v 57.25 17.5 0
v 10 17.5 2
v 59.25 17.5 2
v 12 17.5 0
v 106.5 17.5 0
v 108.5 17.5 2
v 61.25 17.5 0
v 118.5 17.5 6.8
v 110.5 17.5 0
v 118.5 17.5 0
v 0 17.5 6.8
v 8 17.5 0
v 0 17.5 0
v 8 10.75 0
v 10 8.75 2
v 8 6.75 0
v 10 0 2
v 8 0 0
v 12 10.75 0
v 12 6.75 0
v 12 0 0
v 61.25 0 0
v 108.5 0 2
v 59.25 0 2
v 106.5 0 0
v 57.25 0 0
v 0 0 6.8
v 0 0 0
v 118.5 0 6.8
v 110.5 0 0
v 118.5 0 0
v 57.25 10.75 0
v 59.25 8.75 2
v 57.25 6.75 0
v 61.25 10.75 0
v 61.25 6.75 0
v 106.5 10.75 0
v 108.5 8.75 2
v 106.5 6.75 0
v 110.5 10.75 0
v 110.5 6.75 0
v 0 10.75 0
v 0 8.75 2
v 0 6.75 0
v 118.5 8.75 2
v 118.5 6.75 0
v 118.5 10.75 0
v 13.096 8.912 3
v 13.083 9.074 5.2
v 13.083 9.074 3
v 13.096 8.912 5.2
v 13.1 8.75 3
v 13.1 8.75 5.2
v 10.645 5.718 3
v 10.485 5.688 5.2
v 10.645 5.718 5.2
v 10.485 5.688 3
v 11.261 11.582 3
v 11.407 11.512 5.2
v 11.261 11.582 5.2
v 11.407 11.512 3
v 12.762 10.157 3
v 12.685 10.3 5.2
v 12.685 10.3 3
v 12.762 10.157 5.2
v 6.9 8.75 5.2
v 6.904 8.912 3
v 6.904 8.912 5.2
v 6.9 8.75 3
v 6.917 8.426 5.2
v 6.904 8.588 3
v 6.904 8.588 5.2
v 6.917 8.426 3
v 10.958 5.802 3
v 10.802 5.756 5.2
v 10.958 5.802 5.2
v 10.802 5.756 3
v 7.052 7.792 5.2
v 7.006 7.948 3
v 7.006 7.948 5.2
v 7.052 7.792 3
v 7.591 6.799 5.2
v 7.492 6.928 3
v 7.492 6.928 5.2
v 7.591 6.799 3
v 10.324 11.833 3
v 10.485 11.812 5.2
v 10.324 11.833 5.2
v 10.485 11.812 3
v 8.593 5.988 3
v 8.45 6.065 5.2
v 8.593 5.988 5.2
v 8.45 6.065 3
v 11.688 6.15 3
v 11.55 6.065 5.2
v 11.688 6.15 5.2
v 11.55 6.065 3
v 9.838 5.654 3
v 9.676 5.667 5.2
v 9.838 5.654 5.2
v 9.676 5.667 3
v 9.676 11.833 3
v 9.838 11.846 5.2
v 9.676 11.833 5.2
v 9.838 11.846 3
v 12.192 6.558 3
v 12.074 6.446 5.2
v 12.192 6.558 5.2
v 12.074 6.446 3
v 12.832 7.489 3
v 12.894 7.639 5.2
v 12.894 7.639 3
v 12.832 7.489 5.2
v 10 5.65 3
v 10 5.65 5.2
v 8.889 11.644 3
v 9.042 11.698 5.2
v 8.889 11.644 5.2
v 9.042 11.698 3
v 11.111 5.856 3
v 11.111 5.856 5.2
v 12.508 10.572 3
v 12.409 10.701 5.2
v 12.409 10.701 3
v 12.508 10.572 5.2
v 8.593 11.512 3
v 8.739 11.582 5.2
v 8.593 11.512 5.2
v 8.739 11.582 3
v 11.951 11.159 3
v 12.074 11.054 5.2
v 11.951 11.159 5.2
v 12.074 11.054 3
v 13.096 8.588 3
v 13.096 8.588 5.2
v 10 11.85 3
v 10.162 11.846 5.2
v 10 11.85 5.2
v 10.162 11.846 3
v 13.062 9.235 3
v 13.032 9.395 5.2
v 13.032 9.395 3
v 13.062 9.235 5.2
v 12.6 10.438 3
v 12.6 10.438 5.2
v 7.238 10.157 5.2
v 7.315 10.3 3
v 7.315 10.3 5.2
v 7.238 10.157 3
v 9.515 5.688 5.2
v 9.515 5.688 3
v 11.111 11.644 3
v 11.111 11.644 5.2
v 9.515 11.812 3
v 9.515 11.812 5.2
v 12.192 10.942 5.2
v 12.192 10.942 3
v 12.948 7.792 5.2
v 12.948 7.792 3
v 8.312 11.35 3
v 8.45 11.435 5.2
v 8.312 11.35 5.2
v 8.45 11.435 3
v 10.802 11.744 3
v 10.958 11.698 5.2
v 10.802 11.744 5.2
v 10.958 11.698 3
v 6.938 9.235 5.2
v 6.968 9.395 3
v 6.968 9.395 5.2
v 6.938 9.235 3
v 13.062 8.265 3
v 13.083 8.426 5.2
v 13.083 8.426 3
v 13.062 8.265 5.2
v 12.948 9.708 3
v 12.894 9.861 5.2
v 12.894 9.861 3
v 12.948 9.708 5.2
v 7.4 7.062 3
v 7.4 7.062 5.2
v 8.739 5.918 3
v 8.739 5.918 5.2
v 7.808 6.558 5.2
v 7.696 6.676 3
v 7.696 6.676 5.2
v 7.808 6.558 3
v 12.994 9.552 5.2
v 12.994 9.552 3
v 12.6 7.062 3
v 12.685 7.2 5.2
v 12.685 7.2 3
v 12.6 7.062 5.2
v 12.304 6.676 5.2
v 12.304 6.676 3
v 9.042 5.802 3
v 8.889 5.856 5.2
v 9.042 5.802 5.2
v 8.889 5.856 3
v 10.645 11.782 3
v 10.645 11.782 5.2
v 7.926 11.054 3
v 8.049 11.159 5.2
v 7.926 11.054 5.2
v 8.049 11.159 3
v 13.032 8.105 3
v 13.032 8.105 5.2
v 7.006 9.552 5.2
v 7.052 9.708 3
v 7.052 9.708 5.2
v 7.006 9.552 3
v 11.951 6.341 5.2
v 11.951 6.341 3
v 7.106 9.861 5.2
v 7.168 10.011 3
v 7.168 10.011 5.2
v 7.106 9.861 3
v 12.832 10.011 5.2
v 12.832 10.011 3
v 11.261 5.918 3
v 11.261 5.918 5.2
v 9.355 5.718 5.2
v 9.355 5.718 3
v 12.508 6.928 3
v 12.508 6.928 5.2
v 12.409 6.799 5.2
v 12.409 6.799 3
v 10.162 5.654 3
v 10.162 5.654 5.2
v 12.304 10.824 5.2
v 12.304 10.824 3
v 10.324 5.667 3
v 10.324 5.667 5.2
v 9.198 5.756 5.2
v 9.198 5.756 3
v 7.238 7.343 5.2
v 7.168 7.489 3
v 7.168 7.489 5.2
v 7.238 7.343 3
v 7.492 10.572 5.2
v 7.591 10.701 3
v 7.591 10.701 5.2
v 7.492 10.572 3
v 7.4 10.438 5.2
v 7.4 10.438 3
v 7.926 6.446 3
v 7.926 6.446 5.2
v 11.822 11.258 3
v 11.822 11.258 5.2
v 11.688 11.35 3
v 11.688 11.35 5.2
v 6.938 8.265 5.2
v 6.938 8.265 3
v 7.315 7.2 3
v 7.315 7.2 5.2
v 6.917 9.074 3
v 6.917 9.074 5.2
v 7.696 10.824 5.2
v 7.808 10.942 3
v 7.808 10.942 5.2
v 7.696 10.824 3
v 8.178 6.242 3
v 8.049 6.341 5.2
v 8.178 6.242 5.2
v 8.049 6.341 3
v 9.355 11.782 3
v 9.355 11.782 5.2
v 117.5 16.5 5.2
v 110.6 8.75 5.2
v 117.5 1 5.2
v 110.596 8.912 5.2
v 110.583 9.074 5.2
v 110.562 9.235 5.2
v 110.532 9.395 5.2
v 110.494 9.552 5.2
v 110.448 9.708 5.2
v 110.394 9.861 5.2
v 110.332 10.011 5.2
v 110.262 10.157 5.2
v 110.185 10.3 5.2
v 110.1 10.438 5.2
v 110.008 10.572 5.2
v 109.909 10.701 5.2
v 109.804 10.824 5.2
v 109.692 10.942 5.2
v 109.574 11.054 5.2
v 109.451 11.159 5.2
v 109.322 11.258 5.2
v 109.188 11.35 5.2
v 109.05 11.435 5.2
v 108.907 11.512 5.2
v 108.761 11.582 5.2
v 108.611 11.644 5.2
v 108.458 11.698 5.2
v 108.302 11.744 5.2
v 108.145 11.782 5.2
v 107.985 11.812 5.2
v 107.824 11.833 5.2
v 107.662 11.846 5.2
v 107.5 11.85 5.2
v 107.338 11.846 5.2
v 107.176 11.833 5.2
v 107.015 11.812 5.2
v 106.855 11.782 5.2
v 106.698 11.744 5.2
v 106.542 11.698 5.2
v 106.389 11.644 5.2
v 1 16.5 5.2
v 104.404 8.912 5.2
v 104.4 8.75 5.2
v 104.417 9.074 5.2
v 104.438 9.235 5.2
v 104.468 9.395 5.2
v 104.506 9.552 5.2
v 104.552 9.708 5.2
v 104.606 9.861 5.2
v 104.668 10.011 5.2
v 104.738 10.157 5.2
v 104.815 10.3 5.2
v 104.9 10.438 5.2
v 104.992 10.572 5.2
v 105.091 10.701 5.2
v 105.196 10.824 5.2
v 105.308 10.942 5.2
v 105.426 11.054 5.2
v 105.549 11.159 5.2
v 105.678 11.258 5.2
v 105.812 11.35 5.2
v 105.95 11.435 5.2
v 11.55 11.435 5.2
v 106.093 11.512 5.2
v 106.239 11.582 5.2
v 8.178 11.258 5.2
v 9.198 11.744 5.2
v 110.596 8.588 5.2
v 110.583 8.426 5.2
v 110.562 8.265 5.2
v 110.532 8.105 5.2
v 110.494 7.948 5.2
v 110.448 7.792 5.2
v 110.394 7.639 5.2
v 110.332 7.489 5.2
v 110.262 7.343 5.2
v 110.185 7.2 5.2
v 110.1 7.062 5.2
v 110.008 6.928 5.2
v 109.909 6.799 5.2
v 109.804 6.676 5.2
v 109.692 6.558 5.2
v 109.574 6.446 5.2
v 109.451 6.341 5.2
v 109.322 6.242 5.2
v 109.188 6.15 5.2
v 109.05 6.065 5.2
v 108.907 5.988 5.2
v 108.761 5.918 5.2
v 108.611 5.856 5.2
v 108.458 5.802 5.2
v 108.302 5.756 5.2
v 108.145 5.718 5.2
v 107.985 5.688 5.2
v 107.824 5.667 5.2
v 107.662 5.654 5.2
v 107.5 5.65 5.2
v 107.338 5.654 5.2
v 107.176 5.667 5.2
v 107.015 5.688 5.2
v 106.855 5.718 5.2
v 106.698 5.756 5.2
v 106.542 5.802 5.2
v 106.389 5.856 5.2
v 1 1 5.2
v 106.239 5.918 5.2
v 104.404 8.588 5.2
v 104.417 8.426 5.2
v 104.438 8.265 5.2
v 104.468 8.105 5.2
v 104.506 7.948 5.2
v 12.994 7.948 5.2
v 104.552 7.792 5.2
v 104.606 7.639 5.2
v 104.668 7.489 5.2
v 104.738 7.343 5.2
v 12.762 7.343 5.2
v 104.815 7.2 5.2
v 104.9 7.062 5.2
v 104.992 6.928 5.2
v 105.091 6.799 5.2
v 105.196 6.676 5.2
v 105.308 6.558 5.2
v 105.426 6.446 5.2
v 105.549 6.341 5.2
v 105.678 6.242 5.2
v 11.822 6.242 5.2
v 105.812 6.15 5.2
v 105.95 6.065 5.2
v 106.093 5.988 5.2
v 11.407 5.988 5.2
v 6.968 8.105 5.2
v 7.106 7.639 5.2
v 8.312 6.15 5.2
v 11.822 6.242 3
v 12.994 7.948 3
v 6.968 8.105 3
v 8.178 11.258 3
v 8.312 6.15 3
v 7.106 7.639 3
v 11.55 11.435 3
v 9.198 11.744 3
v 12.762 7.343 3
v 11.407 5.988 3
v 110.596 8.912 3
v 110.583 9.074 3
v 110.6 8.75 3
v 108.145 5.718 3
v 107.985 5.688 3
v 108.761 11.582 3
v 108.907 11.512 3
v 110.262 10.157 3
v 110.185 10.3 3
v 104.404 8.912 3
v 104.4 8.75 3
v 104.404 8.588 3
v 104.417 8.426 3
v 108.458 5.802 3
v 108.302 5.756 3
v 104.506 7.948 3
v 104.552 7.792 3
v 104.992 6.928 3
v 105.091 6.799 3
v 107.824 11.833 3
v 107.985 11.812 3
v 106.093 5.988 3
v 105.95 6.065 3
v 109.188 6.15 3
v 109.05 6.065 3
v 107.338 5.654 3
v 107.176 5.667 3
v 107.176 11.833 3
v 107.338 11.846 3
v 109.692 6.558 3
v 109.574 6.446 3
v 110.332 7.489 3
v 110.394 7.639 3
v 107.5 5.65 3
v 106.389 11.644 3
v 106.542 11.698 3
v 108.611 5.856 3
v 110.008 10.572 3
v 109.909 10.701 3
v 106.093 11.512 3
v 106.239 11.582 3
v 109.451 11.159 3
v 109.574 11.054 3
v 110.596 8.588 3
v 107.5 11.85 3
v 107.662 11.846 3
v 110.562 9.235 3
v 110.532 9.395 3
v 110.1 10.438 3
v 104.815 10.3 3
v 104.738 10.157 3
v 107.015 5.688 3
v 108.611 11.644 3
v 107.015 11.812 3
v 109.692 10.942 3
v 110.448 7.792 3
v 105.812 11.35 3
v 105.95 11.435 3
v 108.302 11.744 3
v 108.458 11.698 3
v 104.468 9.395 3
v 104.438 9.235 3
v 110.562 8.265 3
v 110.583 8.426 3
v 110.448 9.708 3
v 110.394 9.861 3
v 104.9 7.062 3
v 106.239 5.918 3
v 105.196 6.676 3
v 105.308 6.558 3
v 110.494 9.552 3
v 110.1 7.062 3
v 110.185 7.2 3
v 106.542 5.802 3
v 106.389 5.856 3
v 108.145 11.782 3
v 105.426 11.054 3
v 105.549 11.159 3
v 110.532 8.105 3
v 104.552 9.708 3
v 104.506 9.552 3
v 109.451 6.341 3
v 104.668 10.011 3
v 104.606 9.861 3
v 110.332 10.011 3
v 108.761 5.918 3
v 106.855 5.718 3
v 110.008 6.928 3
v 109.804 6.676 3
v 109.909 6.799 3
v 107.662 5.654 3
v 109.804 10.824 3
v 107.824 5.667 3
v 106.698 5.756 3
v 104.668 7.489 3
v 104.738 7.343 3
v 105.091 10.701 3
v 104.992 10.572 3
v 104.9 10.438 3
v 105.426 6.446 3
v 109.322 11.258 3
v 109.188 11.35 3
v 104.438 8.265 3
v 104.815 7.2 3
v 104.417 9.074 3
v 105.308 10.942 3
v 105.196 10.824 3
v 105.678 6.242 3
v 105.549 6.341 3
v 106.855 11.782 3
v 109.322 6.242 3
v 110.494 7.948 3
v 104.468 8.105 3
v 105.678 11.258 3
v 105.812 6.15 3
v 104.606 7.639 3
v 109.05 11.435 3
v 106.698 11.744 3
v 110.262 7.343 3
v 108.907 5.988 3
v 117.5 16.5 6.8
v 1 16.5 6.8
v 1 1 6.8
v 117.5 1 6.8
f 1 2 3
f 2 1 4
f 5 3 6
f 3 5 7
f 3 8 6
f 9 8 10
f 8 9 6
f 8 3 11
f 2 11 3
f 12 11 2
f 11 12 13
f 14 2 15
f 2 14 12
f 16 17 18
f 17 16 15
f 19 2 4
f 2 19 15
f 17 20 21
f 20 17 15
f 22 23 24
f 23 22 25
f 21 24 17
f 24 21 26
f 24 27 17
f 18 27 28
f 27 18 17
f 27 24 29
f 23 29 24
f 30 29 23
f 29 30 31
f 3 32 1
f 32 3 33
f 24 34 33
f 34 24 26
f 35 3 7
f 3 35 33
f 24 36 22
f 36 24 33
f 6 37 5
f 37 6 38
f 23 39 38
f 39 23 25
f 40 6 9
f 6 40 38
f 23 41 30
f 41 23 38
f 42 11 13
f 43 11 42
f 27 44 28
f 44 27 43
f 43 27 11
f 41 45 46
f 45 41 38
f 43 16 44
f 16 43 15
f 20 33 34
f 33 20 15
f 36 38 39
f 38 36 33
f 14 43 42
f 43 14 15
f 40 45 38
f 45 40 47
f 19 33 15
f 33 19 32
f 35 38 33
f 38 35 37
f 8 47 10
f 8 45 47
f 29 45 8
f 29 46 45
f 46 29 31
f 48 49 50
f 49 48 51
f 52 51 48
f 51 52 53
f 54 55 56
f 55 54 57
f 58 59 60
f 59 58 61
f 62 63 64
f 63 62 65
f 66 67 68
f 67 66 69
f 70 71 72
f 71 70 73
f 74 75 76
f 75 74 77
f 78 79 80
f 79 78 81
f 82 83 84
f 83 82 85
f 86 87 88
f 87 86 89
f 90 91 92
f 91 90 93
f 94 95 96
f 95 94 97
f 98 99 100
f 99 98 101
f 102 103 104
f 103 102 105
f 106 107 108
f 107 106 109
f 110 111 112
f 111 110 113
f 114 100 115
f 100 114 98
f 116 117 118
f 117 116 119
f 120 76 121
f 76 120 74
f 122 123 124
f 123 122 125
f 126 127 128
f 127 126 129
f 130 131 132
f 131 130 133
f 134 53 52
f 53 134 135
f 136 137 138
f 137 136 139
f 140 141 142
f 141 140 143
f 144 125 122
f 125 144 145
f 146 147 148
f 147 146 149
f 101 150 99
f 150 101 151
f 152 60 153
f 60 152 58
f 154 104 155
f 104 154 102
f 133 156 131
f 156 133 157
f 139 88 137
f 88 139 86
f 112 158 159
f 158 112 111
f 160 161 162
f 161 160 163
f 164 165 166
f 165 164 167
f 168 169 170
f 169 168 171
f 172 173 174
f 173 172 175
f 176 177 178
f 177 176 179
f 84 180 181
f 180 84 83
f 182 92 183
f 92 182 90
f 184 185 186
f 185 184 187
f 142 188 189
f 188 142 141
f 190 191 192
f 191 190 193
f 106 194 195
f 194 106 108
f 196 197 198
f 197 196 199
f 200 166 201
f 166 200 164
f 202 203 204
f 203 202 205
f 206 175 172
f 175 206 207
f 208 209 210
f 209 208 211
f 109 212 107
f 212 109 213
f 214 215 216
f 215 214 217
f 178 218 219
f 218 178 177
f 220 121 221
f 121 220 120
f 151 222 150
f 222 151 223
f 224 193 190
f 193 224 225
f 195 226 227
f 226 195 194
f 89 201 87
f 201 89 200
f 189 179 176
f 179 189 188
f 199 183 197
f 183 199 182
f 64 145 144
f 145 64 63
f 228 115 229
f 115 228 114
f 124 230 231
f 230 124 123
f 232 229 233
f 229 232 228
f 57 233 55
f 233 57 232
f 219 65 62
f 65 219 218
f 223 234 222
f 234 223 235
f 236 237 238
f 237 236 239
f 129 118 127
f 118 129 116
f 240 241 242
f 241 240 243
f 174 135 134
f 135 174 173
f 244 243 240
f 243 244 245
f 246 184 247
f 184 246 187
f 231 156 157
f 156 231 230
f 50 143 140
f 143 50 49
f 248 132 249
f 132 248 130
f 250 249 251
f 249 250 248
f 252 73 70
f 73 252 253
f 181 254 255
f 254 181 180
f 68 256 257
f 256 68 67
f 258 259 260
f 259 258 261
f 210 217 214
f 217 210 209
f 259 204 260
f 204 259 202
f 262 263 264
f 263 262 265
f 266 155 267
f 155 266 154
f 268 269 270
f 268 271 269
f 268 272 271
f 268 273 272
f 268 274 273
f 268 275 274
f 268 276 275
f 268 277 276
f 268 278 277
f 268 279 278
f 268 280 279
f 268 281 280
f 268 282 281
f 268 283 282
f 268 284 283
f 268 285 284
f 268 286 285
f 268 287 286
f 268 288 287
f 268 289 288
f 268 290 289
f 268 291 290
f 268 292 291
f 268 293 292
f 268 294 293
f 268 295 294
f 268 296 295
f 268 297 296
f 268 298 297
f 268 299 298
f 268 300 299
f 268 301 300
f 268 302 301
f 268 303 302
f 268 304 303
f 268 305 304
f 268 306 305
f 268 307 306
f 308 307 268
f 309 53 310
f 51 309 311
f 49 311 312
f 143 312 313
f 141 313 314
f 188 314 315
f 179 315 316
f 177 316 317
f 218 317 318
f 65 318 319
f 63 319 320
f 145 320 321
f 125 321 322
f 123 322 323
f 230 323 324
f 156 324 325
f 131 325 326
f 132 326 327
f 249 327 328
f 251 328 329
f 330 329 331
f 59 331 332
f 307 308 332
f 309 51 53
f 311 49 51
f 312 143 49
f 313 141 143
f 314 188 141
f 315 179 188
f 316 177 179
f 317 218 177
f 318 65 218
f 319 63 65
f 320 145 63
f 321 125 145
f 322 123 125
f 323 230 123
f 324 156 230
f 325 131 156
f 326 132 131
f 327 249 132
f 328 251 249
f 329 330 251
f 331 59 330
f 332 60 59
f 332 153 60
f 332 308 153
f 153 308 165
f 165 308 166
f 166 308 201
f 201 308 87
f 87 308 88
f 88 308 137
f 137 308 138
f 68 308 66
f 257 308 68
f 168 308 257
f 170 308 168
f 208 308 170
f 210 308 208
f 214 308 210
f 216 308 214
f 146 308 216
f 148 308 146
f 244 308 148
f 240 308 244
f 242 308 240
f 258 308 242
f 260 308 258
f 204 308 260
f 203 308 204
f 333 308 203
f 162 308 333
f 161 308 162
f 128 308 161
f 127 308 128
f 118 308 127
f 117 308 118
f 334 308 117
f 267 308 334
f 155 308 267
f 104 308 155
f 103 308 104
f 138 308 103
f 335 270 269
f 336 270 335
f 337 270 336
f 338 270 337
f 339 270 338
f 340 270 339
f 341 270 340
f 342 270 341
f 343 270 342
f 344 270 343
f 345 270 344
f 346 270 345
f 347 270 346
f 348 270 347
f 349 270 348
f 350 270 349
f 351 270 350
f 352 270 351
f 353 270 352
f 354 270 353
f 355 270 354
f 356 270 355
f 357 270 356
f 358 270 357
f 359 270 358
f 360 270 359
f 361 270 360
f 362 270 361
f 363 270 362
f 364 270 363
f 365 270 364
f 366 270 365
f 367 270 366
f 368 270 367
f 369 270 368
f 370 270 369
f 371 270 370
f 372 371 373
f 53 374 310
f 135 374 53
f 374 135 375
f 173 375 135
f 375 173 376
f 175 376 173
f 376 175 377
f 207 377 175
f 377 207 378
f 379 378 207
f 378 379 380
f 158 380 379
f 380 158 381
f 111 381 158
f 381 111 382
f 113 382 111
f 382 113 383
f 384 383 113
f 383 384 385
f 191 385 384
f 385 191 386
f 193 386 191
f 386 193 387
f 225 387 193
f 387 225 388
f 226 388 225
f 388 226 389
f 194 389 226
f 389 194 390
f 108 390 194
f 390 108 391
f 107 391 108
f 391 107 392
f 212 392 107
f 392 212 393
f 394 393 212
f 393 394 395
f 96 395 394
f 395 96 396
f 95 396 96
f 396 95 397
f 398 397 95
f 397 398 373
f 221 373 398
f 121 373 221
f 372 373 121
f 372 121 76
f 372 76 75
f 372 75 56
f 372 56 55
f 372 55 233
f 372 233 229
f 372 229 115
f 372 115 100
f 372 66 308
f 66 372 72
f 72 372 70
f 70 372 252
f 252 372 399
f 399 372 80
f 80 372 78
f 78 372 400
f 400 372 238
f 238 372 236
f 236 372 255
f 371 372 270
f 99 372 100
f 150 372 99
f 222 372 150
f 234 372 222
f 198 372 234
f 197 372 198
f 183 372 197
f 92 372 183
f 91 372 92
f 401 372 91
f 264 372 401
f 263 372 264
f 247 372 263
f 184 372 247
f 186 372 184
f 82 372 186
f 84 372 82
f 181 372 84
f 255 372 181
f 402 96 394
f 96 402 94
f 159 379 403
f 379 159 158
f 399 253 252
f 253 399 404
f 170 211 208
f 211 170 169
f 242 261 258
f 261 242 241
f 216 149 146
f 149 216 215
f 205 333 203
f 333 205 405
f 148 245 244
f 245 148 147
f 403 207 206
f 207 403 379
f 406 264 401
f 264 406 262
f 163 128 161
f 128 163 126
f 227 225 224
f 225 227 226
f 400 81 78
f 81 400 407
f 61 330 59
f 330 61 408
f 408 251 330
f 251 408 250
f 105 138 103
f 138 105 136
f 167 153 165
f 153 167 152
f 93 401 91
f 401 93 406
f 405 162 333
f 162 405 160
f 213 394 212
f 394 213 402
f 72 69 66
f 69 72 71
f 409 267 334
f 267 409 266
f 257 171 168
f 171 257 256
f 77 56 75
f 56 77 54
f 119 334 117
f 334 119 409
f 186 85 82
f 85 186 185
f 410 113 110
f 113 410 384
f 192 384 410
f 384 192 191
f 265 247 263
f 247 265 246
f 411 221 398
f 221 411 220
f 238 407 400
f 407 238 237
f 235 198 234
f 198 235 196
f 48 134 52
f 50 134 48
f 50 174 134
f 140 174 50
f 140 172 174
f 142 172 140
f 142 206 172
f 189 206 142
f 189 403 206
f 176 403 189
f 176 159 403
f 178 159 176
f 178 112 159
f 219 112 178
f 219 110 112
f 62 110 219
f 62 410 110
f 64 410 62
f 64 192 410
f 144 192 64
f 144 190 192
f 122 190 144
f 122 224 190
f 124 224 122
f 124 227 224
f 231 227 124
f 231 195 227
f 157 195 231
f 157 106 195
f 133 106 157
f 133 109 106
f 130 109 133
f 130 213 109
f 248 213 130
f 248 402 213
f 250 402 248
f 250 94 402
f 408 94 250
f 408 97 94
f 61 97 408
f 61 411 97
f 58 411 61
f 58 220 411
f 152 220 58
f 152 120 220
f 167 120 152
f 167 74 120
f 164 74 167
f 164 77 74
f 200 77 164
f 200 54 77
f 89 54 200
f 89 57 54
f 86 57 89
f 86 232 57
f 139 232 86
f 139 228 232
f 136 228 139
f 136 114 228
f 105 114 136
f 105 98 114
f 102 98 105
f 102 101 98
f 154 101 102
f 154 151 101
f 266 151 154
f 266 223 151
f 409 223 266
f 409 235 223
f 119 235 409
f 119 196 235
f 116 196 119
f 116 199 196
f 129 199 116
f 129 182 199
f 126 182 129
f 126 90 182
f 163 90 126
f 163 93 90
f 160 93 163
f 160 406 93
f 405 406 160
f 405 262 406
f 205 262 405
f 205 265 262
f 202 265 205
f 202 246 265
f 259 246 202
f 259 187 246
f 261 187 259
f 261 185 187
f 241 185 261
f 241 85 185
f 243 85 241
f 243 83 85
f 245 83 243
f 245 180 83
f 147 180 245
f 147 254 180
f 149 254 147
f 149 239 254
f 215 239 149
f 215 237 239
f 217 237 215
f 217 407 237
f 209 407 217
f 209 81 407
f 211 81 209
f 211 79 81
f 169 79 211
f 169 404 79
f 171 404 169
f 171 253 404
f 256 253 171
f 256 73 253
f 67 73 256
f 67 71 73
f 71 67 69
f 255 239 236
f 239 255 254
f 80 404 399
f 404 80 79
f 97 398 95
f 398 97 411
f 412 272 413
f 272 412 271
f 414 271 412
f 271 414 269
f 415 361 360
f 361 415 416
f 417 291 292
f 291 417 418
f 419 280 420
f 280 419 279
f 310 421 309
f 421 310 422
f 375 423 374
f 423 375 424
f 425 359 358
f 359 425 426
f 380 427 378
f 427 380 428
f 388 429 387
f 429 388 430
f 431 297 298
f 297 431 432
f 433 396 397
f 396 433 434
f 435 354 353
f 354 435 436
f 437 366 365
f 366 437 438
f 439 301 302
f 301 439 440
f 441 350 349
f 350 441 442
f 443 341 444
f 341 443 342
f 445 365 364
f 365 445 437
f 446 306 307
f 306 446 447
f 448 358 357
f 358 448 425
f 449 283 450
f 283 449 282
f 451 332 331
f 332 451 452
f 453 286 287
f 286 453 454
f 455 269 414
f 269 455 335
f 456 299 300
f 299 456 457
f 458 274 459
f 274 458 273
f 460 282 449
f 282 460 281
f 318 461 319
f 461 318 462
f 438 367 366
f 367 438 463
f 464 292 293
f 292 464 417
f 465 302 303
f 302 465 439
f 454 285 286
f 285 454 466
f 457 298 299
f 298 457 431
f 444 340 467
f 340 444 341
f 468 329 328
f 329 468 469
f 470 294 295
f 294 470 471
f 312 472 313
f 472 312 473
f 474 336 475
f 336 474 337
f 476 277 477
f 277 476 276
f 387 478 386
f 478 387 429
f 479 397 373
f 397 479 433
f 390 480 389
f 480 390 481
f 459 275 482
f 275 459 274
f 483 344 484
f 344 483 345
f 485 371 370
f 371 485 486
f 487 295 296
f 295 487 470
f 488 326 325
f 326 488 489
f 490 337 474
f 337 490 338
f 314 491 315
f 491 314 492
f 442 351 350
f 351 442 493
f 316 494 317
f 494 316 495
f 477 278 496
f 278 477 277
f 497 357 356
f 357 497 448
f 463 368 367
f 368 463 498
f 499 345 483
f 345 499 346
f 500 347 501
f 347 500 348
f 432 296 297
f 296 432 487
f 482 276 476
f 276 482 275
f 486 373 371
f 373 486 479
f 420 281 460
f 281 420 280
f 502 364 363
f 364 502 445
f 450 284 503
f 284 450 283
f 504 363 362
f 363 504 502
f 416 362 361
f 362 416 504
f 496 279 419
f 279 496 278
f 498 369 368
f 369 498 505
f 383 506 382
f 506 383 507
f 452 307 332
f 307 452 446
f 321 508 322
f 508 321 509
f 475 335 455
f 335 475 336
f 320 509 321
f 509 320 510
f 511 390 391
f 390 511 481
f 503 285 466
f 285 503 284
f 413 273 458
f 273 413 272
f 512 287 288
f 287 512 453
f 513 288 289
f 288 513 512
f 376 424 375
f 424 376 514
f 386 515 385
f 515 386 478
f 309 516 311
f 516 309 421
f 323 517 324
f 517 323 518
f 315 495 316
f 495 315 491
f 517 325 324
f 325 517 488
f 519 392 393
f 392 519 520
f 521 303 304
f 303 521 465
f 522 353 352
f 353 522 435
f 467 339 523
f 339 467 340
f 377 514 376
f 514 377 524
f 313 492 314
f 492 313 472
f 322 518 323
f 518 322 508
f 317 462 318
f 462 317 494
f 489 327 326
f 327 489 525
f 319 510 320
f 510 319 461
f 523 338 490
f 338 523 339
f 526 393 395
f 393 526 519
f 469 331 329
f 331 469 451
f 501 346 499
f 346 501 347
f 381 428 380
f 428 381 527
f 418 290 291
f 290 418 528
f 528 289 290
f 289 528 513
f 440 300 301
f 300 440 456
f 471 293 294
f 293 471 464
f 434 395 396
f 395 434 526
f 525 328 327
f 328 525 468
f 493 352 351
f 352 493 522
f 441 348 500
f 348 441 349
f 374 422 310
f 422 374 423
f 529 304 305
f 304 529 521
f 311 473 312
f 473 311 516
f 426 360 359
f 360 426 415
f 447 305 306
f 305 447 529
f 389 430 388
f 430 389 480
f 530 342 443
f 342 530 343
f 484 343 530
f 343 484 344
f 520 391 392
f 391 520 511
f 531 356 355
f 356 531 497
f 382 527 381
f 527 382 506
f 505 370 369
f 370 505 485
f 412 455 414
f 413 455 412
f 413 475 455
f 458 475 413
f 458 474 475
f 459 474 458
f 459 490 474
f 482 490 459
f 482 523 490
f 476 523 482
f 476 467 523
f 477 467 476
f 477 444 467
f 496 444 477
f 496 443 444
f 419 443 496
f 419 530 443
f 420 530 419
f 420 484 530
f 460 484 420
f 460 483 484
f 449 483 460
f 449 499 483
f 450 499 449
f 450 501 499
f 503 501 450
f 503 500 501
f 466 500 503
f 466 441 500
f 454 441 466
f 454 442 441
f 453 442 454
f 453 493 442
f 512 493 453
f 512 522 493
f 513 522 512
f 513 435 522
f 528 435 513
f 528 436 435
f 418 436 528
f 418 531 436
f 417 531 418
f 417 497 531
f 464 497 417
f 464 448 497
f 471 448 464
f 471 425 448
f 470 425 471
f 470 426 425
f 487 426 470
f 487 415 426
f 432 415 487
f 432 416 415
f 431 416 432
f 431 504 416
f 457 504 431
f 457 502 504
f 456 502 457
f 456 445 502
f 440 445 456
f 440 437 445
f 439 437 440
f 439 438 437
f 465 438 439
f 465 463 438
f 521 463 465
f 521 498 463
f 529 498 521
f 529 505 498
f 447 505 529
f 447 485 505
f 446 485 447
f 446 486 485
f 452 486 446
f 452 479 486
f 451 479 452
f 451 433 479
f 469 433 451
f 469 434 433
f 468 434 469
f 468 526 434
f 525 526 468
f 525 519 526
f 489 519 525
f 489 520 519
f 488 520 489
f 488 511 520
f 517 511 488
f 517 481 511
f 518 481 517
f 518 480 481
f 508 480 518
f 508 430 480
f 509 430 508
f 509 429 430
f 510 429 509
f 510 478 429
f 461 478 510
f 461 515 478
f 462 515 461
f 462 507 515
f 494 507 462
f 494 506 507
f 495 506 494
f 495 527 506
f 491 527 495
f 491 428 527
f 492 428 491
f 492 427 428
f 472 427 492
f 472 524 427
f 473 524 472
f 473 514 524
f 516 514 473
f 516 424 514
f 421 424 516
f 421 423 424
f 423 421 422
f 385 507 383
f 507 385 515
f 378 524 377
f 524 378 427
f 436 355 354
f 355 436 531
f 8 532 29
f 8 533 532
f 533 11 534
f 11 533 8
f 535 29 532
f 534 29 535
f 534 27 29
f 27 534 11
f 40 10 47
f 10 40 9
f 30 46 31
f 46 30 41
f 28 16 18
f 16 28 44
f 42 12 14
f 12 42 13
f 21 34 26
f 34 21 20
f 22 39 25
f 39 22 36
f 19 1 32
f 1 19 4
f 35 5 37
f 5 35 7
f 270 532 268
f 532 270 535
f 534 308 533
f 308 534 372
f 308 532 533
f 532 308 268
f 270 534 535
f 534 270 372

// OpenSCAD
// A soft(er) cover for vise jaws, held on with magnets.

length = 116.5;
height = 15.5;
slot_width = 4;

// TODO - move magnet down in a future iteration for embedded magnet

magnet_thickness = 2.2;
magnet_dia = 6.2;

shell = 1.6;


thickness = 1;

difference() {
    cube([length + 2*thickness, height + 2*thickness, (slot_width/2) + shell + thickness + magnet_thickness]);
    
    // indent on the back
    translate([thickness, thickness, (slot_width/2) + thickness + magnet_thickness]) {
        cube([length, height, shell]);
    }
    
    // slots on the face
    translate([0, 0, (slot_width / 2)]) {
        translate([0, (height/2) + thickness, 0]) {
            rotate([-135, 0, 0]) {
                cube([length + 2*thickness, slot_width, slot_width]);
            }
        }
        for(i = [10 : (length/2) + thickness - 10 : length]) {
            translate([i, 0, 0]) {
                rotate([0, 135, 0]) {
                    cube([slot_width, height + 2*thickness, slot_width]);
                }
            }
        }
    }
    
    
    // magnet hole
    for(i = [10 : length + thickness - 20 : length]) {
            translate([i, (height/2) + thickness, thickness + (slot_width/2)]) {
                cylinder($fn=120, h = magnet_thickness, d = magnet_dia);
            }
        }
}
